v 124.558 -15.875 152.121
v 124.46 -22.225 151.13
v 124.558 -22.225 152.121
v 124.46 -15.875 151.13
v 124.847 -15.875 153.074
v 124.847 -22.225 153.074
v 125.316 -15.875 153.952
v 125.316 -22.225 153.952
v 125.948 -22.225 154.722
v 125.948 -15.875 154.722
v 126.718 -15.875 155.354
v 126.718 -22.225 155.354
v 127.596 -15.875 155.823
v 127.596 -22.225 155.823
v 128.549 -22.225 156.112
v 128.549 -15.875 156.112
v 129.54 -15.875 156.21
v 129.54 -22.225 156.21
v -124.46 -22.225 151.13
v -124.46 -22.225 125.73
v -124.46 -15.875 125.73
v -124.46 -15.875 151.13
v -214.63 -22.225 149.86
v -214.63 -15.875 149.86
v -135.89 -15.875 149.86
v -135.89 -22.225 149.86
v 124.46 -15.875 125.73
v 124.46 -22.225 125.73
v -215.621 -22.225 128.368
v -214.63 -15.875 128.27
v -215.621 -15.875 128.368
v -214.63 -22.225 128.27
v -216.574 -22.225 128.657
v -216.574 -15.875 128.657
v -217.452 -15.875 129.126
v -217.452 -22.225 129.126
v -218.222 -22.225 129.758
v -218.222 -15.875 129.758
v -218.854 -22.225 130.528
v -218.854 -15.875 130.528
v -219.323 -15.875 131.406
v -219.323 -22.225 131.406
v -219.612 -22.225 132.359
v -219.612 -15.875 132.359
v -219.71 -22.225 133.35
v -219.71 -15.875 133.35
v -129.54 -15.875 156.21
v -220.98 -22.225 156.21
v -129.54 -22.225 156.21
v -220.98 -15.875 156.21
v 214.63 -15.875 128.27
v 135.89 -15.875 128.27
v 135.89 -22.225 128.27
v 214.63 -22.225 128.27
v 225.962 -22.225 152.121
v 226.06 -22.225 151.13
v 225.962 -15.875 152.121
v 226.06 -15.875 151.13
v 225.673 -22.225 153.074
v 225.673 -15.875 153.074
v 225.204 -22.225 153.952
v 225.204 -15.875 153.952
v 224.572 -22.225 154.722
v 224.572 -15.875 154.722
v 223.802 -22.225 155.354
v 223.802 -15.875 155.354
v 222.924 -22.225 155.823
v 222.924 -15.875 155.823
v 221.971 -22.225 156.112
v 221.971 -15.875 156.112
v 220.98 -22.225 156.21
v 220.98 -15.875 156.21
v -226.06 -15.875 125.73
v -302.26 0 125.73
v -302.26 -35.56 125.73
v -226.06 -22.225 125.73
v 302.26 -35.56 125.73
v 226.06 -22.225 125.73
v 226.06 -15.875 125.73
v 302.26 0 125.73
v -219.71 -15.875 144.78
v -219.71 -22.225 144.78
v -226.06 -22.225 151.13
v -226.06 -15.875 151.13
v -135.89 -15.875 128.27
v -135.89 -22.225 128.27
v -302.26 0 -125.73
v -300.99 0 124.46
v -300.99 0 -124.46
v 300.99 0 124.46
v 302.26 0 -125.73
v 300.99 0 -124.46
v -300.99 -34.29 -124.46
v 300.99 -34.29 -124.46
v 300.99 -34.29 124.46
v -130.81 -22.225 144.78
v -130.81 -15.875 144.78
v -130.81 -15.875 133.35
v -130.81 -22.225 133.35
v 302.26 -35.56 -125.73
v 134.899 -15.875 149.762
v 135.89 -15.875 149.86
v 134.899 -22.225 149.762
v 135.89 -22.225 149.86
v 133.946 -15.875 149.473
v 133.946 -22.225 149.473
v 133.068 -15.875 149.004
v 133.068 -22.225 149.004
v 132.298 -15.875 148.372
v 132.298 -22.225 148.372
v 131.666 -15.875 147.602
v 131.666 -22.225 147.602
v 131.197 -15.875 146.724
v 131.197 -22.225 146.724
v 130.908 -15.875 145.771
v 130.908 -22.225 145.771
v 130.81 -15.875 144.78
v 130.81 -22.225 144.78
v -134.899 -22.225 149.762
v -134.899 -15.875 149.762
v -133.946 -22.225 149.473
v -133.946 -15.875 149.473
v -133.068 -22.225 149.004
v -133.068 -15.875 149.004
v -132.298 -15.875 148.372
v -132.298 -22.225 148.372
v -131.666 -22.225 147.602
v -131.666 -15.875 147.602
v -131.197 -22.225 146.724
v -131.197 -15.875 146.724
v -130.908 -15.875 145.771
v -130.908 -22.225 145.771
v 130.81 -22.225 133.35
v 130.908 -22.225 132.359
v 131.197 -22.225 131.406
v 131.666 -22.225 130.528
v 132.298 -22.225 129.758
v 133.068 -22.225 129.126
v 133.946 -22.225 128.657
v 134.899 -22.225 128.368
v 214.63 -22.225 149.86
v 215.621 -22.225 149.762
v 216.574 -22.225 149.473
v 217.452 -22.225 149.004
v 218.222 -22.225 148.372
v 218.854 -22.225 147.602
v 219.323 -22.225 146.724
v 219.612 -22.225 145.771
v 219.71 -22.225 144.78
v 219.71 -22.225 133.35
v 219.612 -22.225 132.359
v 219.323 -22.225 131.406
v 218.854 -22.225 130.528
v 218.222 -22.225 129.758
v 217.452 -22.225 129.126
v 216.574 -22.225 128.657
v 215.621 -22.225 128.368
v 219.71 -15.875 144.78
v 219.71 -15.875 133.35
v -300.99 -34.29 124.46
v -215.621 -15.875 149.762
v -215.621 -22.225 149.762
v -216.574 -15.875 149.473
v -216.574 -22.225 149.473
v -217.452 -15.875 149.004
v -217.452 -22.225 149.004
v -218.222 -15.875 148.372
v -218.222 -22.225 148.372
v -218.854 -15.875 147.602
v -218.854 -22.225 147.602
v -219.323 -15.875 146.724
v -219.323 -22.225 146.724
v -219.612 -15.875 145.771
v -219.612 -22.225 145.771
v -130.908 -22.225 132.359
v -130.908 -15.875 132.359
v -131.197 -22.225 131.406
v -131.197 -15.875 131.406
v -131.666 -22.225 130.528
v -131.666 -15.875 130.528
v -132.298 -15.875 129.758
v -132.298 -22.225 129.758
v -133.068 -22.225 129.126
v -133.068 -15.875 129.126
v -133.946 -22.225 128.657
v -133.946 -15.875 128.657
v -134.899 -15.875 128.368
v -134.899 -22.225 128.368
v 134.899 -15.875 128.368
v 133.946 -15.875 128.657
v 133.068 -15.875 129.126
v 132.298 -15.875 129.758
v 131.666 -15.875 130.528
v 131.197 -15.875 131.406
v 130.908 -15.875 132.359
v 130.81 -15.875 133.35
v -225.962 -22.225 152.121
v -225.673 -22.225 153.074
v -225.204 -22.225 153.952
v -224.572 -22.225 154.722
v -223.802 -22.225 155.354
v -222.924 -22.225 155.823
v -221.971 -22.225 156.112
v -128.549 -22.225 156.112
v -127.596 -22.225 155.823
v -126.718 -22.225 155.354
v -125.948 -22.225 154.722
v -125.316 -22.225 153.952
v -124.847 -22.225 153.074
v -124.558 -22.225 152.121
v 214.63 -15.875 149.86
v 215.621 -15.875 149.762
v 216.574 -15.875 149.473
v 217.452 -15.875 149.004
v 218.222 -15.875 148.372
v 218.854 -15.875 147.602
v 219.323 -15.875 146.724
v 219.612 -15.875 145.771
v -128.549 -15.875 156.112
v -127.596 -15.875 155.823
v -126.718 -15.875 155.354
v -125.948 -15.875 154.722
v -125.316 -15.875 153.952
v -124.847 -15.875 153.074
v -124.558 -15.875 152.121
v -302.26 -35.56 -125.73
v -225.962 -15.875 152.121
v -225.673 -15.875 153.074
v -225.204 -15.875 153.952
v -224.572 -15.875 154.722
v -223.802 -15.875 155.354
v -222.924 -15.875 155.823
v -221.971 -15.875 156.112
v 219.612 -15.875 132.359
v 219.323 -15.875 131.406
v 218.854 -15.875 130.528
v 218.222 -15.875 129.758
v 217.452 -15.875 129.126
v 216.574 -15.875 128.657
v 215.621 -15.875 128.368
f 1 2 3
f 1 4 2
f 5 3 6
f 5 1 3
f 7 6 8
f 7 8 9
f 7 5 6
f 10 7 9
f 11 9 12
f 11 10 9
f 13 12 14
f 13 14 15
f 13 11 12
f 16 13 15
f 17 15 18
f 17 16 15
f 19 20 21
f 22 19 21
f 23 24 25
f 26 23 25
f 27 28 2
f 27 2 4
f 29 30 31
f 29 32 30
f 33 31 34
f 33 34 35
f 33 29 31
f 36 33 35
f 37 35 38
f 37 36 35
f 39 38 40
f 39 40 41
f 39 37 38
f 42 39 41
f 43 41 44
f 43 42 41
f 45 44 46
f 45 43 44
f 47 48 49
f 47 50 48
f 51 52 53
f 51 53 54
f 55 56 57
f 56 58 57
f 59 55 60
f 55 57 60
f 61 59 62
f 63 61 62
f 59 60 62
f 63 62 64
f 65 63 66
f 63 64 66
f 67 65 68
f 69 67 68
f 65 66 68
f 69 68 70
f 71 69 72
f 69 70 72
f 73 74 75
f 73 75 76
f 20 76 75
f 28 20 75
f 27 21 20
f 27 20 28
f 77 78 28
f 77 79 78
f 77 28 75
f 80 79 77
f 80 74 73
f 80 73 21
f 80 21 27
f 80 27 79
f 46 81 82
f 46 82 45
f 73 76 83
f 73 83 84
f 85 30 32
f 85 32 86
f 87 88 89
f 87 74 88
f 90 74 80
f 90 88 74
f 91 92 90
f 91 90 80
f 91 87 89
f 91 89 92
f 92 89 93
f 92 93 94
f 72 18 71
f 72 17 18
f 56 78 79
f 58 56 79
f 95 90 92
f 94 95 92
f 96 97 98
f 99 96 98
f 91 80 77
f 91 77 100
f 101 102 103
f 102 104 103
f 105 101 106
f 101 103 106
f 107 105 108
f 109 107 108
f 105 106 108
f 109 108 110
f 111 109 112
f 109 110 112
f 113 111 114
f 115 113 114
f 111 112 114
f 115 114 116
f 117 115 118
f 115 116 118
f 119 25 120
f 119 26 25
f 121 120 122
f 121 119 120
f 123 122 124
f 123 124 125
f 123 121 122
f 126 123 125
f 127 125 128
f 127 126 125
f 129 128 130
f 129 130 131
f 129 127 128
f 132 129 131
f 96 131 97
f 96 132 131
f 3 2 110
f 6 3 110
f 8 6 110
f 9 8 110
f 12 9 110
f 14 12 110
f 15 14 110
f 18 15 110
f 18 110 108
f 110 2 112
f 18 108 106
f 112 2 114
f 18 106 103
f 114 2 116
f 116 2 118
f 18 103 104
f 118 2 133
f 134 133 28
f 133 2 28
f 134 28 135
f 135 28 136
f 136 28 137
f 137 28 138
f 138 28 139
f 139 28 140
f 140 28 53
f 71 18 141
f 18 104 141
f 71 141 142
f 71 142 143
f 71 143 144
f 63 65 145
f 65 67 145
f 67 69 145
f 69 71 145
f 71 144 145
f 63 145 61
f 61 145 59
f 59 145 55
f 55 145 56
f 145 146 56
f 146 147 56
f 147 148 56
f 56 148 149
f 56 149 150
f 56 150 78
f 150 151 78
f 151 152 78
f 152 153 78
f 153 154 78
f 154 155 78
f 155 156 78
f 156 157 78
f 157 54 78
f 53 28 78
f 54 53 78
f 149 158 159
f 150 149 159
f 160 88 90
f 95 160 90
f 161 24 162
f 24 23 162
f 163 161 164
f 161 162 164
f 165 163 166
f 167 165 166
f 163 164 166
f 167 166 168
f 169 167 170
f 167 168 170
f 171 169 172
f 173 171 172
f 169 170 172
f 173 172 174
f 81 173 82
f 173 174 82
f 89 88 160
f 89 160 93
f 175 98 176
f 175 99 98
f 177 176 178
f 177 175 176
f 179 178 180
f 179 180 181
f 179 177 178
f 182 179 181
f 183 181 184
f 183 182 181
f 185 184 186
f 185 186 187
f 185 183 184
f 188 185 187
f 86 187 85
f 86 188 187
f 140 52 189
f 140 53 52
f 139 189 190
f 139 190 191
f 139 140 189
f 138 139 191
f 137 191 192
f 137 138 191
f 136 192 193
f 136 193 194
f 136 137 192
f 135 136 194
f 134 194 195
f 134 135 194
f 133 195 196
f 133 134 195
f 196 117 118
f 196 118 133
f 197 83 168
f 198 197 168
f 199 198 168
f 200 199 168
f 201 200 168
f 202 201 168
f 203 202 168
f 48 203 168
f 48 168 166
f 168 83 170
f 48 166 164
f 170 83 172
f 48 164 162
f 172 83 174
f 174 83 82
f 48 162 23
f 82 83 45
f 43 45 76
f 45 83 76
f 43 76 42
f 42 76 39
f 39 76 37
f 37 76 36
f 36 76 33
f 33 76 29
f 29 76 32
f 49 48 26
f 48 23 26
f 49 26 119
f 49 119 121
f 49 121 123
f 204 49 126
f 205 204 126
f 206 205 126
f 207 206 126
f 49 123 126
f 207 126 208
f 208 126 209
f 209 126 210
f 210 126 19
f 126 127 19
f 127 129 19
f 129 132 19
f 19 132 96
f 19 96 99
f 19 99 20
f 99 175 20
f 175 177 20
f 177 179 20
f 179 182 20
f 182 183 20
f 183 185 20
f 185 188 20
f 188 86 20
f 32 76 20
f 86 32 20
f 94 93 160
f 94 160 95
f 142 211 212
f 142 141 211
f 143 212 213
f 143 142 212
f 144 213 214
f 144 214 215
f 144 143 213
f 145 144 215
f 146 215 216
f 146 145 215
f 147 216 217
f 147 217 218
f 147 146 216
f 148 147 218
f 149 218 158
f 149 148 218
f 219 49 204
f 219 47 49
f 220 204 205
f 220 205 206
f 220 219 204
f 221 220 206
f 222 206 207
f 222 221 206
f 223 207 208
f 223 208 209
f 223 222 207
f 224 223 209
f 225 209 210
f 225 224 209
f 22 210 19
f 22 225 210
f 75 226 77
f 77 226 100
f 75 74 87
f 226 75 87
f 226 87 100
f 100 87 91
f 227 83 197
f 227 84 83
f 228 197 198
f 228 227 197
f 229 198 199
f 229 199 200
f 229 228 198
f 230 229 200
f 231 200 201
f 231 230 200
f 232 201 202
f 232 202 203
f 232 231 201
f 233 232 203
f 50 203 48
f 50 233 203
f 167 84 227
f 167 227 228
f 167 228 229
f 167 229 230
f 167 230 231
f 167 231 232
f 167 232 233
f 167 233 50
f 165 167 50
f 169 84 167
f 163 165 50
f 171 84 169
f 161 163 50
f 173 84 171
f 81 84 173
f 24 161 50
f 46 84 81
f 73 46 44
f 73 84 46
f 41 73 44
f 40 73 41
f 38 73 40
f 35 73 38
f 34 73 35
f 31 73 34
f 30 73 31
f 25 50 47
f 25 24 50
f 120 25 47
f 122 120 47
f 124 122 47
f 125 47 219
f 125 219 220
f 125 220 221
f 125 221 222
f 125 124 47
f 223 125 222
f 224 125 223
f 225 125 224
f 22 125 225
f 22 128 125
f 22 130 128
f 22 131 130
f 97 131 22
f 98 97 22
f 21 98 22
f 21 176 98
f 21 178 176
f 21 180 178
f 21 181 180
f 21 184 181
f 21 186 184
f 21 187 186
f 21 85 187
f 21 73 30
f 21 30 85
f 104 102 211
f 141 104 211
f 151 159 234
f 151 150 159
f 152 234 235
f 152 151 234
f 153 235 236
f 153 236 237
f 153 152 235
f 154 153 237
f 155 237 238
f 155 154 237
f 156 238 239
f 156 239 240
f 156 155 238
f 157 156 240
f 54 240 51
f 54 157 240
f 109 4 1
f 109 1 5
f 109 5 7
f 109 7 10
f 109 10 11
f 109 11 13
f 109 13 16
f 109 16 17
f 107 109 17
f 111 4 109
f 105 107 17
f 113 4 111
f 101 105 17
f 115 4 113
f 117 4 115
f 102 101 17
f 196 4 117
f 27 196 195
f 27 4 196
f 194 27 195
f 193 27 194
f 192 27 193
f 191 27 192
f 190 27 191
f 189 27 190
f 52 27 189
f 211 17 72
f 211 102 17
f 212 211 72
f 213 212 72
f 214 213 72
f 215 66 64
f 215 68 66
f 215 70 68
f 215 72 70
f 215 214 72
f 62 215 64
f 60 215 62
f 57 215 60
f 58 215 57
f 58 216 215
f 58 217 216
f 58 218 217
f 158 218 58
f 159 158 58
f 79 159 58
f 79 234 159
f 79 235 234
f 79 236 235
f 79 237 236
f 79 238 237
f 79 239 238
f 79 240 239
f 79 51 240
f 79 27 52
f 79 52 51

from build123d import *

# Parameters (mm, degrees)
SKETCH1_W           = 604.52
SKETCH1_H           = 251.46
BOSS_EXTRUDE1_DEPTH = 35.56
SKETCH2_W           = 601.98
SKETCH2_H           = 248.92
CUT_EXTRUDE1_DEPTH  = 34.29
SKETCH3_W           = 101.6
SKETCH3_H           = 6.35
BOSS_EXTRUDE2_DEPTH = 30.48
SKETCH4_W           = 88.9
SKETCH4_H           = 21.59
CUT_EXTRUDE2_DEPTH  = 341.808114523
FILLET1_R           = 5.08
FILLET2_R           = 5.08


with BuildPart() as part:
    # Sketch1 → Boss-Extrude1 (new body)
    with BuildSketch(Plane(origin=(0, 0, 0), x_dir=(1, 0, 0), z_dir=(0, 1, 0))):
        Rectangle(SKETCH1_W, SKETCH1_H)
    extrude(amount=-BOSS_EXTRUDE1_DEPTH)

    # Sketch2 → Cut-Extrude1 (cut)
    with BuildSketch(Plane(origin=(0, 0, 0), x_dir=(1, 0, 0), z_dir=(0, 1, 0))):
        Rectangle(SKETCH2_W, SKETCH2_H)
    extrude(amount=-CUT_EXTRUDE1_DEPTH, mode=Mode.SUBTRACT)

    # Sketch3 → Boss-Extrude2 (add)
    with BuildSketch(Plane.XY.offset(125.73)):
        with Locations((-175.26, -19.05)):
            Rectangle(SKETCH3_W, SKETCH3_H)
        with Locations((175.26, -19.05)):
            Rectangle(SKETCH3_W, SKETCH3_H)
    extrude(amount=BOSS_EXTRUDE2_DEPTH)

    # Sketch4 → Cut-Extrude2 (cut, through all)
    with BuildSketch(Plane(origin=(0, -15.875, 0), x_dir=(1, 0, 0), z_dir=(0, 1, 0))):
        with Locations((-175.26, -139.065)):
            Rectangle(SKETCH4_W, SKETCH4_H)
        with Locations((175.26, -139.065)):
            Rectangle(SKETCH4_W, SKETCH4_H)
    extrude(amount=-CUT_EXTRUDE2_DEPTH, mode=Mode.SUBTRACT)

    # Fillet1
    fillet1_edges = [part.edges().sort_by_distance(p)[0] for p in [
        (-219.71, -19.05, 149.86),
        (-219.71, -19.05, 128.27),
        (-130.81, -19.05, 128.27),
        (-130.81, -19.05, 149.86),
        (219.71, -19.05, 128.27),
        (219.71, -19.05, 149.86),
        (130.81, -19.05, 149.86),
        (130.81, -19.05, 128.27),
    ]]
    fillet(fillet1_edges, radius=FILLET1_R)

    # Fillet2
    fillet2_edges = [part.edges().sort_by_distance(p)[0] for p in [
        (-226.06, -19.05, 156.21),
        (-124.46, -19.05, 156.21),
        (226.06, -19.05, 156.21),
        (124.46, -19.05, 156.21),
    ]]
    fillet(fillet2_edges, radius=FILLET2_R)


solid = part.part
